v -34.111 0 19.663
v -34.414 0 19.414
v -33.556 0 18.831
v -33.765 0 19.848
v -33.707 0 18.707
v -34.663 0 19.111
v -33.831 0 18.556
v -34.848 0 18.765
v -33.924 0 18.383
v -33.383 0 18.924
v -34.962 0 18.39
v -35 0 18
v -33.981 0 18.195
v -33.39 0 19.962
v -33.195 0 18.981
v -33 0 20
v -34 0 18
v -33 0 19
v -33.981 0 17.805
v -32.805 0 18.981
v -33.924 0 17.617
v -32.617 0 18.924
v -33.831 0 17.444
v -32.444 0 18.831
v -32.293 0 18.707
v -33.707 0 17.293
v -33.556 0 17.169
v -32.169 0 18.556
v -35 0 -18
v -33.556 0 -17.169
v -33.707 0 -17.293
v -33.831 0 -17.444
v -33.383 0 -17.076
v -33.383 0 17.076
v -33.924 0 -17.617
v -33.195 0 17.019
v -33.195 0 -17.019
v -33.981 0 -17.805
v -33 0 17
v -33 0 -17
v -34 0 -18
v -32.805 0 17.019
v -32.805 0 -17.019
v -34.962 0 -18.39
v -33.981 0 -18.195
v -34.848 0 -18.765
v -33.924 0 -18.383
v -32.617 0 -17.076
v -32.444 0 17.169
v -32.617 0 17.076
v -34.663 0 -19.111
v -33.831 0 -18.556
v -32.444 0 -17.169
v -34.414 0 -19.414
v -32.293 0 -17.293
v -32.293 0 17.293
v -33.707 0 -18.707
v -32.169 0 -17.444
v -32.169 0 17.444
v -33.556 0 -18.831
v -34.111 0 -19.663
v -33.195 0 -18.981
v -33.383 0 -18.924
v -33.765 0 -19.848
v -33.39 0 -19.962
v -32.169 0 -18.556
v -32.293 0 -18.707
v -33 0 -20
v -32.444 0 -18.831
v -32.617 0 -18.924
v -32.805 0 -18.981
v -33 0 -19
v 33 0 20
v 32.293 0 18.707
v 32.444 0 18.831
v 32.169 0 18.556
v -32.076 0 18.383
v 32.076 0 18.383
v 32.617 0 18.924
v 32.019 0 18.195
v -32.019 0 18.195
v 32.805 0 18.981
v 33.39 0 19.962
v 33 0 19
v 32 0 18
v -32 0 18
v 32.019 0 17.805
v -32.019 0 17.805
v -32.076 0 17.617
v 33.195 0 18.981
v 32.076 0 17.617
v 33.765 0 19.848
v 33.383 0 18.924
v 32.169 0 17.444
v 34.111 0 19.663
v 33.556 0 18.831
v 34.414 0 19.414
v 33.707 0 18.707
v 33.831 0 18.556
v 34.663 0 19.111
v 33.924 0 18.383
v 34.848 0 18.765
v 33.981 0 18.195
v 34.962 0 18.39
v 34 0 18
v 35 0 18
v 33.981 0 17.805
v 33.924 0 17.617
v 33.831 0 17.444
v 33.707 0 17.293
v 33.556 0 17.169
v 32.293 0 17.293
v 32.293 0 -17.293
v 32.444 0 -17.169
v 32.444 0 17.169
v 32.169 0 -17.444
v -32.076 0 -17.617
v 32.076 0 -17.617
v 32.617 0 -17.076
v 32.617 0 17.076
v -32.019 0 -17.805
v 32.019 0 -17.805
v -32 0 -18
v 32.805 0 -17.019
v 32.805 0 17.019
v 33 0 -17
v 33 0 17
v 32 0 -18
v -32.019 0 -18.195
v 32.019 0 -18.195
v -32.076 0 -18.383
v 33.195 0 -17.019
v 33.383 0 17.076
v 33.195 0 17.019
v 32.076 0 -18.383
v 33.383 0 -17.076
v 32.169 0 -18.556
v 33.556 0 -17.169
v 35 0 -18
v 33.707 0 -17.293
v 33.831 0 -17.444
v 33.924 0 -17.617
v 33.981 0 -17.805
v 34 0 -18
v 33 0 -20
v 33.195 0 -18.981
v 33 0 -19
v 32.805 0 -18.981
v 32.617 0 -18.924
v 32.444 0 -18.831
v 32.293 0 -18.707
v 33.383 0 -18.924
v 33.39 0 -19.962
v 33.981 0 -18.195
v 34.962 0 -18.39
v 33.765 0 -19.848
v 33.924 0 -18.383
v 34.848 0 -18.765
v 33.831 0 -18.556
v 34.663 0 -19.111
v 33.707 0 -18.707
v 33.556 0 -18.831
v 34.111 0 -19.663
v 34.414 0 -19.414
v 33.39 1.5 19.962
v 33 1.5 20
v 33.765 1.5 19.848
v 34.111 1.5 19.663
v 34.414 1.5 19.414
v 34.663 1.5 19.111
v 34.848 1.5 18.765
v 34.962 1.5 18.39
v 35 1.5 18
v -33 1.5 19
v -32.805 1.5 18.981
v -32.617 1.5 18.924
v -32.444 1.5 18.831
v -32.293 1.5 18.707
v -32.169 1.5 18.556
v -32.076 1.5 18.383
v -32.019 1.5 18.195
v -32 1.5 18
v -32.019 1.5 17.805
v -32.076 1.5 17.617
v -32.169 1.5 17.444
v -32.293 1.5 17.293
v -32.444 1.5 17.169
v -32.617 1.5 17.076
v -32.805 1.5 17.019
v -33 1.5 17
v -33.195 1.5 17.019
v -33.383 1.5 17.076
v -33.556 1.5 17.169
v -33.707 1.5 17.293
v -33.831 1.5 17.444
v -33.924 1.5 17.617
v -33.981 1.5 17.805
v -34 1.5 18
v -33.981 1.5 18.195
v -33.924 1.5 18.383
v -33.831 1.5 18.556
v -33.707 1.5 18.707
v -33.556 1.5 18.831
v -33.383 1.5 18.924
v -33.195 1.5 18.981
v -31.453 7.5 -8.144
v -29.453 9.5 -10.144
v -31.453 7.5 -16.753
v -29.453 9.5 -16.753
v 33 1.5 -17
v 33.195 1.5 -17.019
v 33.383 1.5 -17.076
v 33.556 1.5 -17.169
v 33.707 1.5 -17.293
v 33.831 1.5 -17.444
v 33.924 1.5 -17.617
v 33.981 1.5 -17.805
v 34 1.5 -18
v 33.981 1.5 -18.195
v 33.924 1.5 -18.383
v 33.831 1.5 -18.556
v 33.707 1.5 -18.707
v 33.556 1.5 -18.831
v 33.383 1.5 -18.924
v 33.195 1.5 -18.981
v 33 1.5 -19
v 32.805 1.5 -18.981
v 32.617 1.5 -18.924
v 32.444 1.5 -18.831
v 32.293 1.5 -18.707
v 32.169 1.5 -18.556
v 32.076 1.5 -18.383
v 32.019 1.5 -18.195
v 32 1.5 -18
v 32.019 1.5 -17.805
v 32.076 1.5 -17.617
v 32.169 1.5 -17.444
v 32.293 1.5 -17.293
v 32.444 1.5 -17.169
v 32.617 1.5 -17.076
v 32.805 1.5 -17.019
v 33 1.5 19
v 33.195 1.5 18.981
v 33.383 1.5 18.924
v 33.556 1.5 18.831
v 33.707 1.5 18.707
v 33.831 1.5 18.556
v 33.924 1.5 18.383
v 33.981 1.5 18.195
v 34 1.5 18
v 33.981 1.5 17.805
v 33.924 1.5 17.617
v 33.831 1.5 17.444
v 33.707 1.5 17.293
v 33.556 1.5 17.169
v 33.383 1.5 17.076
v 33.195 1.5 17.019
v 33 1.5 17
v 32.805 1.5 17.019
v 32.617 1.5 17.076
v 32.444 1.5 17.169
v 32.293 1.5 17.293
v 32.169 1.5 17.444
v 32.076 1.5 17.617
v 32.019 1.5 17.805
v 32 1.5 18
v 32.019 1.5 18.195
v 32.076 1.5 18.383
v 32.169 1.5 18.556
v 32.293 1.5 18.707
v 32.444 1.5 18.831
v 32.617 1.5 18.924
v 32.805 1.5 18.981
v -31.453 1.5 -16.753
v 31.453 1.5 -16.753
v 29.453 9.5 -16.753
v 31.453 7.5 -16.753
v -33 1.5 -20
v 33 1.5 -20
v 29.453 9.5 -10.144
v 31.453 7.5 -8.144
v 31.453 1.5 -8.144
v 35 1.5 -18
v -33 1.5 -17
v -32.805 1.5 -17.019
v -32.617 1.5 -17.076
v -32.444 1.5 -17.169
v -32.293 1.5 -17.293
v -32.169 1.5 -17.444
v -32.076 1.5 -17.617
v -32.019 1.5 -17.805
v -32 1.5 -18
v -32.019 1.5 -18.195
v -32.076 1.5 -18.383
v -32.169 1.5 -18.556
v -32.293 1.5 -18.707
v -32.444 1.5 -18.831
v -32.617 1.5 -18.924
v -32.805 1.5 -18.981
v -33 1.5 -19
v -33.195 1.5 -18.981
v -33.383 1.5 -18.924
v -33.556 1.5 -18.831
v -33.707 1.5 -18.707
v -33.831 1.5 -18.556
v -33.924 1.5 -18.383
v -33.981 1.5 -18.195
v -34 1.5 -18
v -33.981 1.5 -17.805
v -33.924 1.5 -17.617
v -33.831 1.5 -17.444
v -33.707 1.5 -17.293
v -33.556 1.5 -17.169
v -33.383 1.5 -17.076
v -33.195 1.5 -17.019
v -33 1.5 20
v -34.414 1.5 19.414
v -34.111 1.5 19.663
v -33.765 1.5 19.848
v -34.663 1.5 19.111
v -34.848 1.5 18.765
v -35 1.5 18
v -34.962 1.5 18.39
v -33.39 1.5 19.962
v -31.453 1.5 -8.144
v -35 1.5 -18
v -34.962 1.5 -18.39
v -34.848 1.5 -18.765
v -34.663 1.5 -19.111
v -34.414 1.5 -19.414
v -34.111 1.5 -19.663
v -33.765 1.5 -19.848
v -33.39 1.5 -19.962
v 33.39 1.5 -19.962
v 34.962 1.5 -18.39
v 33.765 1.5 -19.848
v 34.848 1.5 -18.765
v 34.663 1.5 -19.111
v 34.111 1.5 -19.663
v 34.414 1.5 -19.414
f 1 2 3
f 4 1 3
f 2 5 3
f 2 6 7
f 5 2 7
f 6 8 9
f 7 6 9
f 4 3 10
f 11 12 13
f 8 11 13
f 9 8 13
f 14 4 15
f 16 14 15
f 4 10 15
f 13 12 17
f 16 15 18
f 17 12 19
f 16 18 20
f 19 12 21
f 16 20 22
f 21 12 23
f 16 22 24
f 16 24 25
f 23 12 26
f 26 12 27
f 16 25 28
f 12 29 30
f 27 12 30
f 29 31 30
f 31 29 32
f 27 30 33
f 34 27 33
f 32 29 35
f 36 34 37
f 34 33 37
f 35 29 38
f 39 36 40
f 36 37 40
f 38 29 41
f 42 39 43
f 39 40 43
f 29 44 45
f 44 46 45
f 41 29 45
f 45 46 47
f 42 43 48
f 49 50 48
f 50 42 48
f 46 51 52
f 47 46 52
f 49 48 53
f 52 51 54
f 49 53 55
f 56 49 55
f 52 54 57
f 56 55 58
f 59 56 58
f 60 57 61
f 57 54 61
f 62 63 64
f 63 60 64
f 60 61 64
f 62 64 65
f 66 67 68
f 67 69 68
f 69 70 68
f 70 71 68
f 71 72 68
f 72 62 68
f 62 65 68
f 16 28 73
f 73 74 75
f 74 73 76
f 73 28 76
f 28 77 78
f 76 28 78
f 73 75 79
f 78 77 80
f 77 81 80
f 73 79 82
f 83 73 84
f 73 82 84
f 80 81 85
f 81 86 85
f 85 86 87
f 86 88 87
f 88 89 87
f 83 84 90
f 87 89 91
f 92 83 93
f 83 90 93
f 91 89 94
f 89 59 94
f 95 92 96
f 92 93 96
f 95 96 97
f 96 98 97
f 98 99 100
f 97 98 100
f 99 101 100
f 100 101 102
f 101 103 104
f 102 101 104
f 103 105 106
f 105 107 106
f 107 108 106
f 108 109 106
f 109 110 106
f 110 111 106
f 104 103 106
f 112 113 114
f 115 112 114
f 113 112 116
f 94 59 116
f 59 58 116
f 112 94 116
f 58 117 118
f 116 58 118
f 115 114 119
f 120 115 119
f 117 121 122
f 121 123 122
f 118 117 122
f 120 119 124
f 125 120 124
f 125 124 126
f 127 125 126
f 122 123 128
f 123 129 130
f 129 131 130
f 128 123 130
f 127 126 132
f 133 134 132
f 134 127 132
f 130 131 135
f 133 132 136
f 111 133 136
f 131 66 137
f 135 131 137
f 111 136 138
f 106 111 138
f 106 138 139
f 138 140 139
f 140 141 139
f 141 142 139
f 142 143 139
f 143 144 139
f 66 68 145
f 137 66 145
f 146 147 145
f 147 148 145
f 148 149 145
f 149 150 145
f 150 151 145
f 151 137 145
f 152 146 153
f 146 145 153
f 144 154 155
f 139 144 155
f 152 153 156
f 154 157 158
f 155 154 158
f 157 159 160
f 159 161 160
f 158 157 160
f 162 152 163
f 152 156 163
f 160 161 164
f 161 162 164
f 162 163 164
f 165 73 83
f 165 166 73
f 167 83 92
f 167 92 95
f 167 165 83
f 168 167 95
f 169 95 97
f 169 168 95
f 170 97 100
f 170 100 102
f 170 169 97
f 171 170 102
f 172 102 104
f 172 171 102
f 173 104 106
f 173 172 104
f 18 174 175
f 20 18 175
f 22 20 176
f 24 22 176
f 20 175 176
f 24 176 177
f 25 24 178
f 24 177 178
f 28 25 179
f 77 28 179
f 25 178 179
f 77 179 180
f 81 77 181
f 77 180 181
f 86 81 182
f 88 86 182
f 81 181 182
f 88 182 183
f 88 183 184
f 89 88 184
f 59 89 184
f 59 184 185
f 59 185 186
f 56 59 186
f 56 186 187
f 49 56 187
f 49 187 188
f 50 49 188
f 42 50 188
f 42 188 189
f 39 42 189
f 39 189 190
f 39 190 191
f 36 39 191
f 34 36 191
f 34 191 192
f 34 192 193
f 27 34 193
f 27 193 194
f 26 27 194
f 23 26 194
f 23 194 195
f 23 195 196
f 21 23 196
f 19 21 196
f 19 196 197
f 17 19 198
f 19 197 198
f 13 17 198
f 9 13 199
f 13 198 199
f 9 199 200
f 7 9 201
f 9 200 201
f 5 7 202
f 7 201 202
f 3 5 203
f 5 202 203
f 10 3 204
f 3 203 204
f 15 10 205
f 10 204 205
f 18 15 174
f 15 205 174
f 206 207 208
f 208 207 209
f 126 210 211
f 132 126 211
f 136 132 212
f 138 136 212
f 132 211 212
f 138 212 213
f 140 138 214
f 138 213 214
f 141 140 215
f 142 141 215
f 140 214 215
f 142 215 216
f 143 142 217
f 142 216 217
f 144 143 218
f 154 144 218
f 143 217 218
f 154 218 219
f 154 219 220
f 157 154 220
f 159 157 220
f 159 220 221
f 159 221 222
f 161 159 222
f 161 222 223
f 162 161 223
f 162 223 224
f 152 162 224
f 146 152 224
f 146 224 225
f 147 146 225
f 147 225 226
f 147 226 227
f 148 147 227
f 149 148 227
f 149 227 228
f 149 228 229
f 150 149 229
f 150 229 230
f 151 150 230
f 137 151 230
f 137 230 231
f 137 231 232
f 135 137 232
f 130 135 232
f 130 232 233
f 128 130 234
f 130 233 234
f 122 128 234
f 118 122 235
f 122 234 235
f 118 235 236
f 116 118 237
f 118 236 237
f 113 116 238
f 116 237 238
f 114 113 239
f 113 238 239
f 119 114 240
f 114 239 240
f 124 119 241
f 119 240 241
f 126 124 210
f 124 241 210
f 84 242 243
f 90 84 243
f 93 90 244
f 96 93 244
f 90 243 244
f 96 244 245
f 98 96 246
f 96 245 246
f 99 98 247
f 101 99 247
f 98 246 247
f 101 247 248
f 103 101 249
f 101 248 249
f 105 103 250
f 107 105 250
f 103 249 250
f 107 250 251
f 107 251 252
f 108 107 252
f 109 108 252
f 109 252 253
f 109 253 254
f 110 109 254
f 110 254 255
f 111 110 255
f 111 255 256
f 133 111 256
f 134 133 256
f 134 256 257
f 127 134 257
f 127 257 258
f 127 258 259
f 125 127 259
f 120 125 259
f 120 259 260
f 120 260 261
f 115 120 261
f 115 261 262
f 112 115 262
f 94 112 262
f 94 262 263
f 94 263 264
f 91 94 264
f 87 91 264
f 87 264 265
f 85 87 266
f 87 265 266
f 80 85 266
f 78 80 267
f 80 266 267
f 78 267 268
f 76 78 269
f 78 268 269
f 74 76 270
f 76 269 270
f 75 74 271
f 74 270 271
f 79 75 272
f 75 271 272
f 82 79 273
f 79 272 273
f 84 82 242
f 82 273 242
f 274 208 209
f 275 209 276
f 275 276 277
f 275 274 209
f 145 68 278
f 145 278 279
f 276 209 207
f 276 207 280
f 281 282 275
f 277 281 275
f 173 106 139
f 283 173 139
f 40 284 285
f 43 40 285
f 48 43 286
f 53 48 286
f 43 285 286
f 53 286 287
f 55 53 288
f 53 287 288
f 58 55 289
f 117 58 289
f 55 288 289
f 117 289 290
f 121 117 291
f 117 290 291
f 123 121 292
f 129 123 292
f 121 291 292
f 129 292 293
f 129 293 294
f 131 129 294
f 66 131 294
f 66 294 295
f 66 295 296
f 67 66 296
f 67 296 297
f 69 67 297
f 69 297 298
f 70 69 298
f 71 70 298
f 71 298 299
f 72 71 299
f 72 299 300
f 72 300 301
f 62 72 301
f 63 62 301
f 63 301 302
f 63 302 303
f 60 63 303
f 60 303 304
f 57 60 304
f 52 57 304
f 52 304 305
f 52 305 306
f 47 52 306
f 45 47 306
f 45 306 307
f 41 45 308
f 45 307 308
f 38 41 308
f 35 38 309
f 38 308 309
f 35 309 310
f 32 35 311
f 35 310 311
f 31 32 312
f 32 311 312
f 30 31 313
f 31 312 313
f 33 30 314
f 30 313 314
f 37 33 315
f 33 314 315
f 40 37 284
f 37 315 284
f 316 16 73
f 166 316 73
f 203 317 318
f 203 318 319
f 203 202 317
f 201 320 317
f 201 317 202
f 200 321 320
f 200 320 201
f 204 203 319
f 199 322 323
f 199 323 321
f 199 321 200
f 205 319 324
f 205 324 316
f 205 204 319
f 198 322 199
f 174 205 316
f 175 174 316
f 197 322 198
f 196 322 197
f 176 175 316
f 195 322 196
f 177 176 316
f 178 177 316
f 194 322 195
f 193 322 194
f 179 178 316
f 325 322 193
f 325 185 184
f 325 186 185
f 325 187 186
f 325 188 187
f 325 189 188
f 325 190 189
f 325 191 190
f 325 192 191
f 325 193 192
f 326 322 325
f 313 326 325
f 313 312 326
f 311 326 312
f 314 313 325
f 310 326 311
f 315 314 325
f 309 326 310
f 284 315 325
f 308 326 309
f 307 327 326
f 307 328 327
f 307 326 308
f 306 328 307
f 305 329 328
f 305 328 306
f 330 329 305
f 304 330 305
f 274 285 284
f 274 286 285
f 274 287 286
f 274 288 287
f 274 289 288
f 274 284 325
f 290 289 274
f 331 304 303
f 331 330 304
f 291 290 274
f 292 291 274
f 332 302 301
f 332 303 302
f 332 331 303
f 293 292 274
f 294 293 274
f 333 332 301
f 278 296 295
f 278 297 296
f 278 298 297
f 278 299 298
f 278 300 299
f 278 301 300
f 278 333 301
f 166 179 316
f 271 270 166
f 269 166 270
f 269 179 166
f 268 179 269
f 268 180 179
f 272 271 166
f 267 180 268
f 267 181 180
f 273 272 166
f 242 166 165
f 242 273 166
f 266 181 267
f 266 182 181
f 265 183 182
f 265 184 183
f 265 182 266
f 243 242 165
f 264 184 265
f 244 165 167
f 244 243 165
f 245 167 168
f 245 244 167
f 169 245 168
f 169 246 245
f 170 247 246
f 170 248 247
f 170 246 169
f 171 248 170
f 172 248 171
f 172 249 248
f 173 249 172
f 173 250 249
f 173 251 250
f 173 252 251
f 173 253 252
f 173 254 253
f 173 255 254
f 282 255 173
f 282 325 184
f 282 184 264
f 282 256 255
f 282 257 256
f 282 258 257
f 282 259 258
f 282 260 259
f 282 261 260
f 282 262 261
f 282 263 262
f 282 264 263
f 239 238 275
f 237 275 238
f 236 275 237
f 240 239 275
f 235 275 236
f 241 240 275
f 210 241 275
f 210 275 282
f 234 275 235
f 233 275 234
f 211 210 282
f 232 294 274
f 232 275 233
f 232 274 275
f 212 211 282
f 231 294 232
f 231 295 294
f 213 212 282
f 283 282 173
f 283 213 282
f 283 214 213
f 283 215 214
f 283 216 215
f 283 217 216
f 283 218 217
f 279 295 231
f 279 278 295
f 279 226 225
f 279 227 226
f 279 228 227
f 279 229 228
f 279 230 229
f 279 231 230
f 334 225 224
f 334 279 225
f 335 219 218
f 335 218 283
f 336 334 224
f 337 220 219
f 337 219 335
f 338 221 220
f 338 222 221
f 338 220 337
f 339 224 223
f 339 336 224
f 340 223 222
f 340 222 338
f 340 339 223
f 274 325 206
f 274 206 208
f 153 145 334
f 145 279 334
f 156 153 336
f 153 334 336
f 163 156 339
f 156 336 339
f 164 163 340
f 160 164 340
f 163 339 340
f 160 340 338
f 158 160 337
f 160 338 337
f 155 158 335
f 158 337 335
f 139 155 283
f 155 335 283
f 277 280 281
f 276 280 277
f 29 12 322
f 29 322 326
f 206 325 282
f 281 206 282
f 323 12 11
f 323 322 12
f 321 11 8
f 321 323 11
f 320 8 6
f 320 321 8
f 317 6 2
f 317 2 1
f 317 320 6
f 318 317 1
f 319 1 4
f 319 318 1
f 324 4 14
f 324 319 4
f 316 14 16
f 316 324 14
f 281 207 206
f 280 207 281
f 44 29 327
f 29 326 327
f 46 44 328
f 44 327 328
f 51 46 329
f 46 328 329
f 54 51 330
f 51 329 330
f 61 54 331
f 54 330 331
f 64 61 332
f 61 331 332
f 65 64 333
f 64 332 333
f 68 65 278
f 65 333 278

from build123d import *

# Parameters (mm, degrees)
SKETCH1_W           = 70
SKETCH1_H           = 40
BOSS_EXTRUDE1_DEPTH = 1.5
SKETCH2_W           = 62.906558998
SKETCH2_H           = 8.609060895
BOSS_EXTRUDE2_DEPTH = 8
CHAMFER1_SIZE       = 2
SKETCH3_R           = 1
CUT_EXTRUDE1_DEPTH  = 42.097445176
FILLET1_R           = 2


with BuildPart() as part:
    # Sketch1 → Boss-Extrude1 (new body)
    with BuildSketch(Plane(origin=(0, 0, 0), x_dir=(1, 0, 0), z_dir=(0, 1, 0))):
        Rectangle(SKETCH1_W, SKETCH1_H)
    extrude(amount=BOSS_EXTRUDE1_DEPTH)

    # Sketch2 → Boss-Extrude2 (add)
    with BuildSketch(Plane(origin=(0, 1.5, 0), x_dir=(1, 0, 0), z_dir=(0, 1, 0))):
        with Locations((0, 12.448226713)):
            Rectangle(SKETCH2_W, SKETCH2_H)
    extrude(amount=BOSS_EXTRUDE2_DEPTH)

    # Chamfer1
    chamfer1_edges = [part.edges().sort_by_distance(p)[0] for p in [
        (31.453279499, 9.5, -12.448226713),
        (-31.453279499, 9.5, -12.448226713),
        (0, 9.5, -8.143696265),
    ]]
    chamfer(chamfer1_edges, length=CHAMFER1_SIZE)

    # Sketch3 → Cut-Extrude1 (cut, through all)
    with BuildSketch(Plane(origin=(0, 1.5, 0), x_dir=(1, 0, 0), z_dir=(0, 1, 0))):
        with Locations(Location((-33, -18, 0), (0, 0, 270))):
            Circle(SKETCH3_R)
        with Locations(Location((-33, 18, 0), (0, 0, 270))):
            Circle(SKETCH3_R)
        with Locations(Location((33, 18, 0), (0, 0, 270))):
            Circle(SKETCH3_R)
        with Locations(Location((33, -18, 0), (0, 0, 270))):
            Circle(SKETCH3_R)
    extrude(amount=-CUT_EXTRUDE1_DEPTH, mode=Mode.SUBTRACT)

    # Fillet1
    fillet1_edges = [part.edges().sort_by_distance(p)[0] for p in [
        (35, 0.75, 20),
        (-35, 0.75, 20),
        (-35, 0.75, -20),
        (35, 0.75, -20),
    ]]
    fillet(fillet1_edges, radius=FILLET1_R)


solid = part.part
